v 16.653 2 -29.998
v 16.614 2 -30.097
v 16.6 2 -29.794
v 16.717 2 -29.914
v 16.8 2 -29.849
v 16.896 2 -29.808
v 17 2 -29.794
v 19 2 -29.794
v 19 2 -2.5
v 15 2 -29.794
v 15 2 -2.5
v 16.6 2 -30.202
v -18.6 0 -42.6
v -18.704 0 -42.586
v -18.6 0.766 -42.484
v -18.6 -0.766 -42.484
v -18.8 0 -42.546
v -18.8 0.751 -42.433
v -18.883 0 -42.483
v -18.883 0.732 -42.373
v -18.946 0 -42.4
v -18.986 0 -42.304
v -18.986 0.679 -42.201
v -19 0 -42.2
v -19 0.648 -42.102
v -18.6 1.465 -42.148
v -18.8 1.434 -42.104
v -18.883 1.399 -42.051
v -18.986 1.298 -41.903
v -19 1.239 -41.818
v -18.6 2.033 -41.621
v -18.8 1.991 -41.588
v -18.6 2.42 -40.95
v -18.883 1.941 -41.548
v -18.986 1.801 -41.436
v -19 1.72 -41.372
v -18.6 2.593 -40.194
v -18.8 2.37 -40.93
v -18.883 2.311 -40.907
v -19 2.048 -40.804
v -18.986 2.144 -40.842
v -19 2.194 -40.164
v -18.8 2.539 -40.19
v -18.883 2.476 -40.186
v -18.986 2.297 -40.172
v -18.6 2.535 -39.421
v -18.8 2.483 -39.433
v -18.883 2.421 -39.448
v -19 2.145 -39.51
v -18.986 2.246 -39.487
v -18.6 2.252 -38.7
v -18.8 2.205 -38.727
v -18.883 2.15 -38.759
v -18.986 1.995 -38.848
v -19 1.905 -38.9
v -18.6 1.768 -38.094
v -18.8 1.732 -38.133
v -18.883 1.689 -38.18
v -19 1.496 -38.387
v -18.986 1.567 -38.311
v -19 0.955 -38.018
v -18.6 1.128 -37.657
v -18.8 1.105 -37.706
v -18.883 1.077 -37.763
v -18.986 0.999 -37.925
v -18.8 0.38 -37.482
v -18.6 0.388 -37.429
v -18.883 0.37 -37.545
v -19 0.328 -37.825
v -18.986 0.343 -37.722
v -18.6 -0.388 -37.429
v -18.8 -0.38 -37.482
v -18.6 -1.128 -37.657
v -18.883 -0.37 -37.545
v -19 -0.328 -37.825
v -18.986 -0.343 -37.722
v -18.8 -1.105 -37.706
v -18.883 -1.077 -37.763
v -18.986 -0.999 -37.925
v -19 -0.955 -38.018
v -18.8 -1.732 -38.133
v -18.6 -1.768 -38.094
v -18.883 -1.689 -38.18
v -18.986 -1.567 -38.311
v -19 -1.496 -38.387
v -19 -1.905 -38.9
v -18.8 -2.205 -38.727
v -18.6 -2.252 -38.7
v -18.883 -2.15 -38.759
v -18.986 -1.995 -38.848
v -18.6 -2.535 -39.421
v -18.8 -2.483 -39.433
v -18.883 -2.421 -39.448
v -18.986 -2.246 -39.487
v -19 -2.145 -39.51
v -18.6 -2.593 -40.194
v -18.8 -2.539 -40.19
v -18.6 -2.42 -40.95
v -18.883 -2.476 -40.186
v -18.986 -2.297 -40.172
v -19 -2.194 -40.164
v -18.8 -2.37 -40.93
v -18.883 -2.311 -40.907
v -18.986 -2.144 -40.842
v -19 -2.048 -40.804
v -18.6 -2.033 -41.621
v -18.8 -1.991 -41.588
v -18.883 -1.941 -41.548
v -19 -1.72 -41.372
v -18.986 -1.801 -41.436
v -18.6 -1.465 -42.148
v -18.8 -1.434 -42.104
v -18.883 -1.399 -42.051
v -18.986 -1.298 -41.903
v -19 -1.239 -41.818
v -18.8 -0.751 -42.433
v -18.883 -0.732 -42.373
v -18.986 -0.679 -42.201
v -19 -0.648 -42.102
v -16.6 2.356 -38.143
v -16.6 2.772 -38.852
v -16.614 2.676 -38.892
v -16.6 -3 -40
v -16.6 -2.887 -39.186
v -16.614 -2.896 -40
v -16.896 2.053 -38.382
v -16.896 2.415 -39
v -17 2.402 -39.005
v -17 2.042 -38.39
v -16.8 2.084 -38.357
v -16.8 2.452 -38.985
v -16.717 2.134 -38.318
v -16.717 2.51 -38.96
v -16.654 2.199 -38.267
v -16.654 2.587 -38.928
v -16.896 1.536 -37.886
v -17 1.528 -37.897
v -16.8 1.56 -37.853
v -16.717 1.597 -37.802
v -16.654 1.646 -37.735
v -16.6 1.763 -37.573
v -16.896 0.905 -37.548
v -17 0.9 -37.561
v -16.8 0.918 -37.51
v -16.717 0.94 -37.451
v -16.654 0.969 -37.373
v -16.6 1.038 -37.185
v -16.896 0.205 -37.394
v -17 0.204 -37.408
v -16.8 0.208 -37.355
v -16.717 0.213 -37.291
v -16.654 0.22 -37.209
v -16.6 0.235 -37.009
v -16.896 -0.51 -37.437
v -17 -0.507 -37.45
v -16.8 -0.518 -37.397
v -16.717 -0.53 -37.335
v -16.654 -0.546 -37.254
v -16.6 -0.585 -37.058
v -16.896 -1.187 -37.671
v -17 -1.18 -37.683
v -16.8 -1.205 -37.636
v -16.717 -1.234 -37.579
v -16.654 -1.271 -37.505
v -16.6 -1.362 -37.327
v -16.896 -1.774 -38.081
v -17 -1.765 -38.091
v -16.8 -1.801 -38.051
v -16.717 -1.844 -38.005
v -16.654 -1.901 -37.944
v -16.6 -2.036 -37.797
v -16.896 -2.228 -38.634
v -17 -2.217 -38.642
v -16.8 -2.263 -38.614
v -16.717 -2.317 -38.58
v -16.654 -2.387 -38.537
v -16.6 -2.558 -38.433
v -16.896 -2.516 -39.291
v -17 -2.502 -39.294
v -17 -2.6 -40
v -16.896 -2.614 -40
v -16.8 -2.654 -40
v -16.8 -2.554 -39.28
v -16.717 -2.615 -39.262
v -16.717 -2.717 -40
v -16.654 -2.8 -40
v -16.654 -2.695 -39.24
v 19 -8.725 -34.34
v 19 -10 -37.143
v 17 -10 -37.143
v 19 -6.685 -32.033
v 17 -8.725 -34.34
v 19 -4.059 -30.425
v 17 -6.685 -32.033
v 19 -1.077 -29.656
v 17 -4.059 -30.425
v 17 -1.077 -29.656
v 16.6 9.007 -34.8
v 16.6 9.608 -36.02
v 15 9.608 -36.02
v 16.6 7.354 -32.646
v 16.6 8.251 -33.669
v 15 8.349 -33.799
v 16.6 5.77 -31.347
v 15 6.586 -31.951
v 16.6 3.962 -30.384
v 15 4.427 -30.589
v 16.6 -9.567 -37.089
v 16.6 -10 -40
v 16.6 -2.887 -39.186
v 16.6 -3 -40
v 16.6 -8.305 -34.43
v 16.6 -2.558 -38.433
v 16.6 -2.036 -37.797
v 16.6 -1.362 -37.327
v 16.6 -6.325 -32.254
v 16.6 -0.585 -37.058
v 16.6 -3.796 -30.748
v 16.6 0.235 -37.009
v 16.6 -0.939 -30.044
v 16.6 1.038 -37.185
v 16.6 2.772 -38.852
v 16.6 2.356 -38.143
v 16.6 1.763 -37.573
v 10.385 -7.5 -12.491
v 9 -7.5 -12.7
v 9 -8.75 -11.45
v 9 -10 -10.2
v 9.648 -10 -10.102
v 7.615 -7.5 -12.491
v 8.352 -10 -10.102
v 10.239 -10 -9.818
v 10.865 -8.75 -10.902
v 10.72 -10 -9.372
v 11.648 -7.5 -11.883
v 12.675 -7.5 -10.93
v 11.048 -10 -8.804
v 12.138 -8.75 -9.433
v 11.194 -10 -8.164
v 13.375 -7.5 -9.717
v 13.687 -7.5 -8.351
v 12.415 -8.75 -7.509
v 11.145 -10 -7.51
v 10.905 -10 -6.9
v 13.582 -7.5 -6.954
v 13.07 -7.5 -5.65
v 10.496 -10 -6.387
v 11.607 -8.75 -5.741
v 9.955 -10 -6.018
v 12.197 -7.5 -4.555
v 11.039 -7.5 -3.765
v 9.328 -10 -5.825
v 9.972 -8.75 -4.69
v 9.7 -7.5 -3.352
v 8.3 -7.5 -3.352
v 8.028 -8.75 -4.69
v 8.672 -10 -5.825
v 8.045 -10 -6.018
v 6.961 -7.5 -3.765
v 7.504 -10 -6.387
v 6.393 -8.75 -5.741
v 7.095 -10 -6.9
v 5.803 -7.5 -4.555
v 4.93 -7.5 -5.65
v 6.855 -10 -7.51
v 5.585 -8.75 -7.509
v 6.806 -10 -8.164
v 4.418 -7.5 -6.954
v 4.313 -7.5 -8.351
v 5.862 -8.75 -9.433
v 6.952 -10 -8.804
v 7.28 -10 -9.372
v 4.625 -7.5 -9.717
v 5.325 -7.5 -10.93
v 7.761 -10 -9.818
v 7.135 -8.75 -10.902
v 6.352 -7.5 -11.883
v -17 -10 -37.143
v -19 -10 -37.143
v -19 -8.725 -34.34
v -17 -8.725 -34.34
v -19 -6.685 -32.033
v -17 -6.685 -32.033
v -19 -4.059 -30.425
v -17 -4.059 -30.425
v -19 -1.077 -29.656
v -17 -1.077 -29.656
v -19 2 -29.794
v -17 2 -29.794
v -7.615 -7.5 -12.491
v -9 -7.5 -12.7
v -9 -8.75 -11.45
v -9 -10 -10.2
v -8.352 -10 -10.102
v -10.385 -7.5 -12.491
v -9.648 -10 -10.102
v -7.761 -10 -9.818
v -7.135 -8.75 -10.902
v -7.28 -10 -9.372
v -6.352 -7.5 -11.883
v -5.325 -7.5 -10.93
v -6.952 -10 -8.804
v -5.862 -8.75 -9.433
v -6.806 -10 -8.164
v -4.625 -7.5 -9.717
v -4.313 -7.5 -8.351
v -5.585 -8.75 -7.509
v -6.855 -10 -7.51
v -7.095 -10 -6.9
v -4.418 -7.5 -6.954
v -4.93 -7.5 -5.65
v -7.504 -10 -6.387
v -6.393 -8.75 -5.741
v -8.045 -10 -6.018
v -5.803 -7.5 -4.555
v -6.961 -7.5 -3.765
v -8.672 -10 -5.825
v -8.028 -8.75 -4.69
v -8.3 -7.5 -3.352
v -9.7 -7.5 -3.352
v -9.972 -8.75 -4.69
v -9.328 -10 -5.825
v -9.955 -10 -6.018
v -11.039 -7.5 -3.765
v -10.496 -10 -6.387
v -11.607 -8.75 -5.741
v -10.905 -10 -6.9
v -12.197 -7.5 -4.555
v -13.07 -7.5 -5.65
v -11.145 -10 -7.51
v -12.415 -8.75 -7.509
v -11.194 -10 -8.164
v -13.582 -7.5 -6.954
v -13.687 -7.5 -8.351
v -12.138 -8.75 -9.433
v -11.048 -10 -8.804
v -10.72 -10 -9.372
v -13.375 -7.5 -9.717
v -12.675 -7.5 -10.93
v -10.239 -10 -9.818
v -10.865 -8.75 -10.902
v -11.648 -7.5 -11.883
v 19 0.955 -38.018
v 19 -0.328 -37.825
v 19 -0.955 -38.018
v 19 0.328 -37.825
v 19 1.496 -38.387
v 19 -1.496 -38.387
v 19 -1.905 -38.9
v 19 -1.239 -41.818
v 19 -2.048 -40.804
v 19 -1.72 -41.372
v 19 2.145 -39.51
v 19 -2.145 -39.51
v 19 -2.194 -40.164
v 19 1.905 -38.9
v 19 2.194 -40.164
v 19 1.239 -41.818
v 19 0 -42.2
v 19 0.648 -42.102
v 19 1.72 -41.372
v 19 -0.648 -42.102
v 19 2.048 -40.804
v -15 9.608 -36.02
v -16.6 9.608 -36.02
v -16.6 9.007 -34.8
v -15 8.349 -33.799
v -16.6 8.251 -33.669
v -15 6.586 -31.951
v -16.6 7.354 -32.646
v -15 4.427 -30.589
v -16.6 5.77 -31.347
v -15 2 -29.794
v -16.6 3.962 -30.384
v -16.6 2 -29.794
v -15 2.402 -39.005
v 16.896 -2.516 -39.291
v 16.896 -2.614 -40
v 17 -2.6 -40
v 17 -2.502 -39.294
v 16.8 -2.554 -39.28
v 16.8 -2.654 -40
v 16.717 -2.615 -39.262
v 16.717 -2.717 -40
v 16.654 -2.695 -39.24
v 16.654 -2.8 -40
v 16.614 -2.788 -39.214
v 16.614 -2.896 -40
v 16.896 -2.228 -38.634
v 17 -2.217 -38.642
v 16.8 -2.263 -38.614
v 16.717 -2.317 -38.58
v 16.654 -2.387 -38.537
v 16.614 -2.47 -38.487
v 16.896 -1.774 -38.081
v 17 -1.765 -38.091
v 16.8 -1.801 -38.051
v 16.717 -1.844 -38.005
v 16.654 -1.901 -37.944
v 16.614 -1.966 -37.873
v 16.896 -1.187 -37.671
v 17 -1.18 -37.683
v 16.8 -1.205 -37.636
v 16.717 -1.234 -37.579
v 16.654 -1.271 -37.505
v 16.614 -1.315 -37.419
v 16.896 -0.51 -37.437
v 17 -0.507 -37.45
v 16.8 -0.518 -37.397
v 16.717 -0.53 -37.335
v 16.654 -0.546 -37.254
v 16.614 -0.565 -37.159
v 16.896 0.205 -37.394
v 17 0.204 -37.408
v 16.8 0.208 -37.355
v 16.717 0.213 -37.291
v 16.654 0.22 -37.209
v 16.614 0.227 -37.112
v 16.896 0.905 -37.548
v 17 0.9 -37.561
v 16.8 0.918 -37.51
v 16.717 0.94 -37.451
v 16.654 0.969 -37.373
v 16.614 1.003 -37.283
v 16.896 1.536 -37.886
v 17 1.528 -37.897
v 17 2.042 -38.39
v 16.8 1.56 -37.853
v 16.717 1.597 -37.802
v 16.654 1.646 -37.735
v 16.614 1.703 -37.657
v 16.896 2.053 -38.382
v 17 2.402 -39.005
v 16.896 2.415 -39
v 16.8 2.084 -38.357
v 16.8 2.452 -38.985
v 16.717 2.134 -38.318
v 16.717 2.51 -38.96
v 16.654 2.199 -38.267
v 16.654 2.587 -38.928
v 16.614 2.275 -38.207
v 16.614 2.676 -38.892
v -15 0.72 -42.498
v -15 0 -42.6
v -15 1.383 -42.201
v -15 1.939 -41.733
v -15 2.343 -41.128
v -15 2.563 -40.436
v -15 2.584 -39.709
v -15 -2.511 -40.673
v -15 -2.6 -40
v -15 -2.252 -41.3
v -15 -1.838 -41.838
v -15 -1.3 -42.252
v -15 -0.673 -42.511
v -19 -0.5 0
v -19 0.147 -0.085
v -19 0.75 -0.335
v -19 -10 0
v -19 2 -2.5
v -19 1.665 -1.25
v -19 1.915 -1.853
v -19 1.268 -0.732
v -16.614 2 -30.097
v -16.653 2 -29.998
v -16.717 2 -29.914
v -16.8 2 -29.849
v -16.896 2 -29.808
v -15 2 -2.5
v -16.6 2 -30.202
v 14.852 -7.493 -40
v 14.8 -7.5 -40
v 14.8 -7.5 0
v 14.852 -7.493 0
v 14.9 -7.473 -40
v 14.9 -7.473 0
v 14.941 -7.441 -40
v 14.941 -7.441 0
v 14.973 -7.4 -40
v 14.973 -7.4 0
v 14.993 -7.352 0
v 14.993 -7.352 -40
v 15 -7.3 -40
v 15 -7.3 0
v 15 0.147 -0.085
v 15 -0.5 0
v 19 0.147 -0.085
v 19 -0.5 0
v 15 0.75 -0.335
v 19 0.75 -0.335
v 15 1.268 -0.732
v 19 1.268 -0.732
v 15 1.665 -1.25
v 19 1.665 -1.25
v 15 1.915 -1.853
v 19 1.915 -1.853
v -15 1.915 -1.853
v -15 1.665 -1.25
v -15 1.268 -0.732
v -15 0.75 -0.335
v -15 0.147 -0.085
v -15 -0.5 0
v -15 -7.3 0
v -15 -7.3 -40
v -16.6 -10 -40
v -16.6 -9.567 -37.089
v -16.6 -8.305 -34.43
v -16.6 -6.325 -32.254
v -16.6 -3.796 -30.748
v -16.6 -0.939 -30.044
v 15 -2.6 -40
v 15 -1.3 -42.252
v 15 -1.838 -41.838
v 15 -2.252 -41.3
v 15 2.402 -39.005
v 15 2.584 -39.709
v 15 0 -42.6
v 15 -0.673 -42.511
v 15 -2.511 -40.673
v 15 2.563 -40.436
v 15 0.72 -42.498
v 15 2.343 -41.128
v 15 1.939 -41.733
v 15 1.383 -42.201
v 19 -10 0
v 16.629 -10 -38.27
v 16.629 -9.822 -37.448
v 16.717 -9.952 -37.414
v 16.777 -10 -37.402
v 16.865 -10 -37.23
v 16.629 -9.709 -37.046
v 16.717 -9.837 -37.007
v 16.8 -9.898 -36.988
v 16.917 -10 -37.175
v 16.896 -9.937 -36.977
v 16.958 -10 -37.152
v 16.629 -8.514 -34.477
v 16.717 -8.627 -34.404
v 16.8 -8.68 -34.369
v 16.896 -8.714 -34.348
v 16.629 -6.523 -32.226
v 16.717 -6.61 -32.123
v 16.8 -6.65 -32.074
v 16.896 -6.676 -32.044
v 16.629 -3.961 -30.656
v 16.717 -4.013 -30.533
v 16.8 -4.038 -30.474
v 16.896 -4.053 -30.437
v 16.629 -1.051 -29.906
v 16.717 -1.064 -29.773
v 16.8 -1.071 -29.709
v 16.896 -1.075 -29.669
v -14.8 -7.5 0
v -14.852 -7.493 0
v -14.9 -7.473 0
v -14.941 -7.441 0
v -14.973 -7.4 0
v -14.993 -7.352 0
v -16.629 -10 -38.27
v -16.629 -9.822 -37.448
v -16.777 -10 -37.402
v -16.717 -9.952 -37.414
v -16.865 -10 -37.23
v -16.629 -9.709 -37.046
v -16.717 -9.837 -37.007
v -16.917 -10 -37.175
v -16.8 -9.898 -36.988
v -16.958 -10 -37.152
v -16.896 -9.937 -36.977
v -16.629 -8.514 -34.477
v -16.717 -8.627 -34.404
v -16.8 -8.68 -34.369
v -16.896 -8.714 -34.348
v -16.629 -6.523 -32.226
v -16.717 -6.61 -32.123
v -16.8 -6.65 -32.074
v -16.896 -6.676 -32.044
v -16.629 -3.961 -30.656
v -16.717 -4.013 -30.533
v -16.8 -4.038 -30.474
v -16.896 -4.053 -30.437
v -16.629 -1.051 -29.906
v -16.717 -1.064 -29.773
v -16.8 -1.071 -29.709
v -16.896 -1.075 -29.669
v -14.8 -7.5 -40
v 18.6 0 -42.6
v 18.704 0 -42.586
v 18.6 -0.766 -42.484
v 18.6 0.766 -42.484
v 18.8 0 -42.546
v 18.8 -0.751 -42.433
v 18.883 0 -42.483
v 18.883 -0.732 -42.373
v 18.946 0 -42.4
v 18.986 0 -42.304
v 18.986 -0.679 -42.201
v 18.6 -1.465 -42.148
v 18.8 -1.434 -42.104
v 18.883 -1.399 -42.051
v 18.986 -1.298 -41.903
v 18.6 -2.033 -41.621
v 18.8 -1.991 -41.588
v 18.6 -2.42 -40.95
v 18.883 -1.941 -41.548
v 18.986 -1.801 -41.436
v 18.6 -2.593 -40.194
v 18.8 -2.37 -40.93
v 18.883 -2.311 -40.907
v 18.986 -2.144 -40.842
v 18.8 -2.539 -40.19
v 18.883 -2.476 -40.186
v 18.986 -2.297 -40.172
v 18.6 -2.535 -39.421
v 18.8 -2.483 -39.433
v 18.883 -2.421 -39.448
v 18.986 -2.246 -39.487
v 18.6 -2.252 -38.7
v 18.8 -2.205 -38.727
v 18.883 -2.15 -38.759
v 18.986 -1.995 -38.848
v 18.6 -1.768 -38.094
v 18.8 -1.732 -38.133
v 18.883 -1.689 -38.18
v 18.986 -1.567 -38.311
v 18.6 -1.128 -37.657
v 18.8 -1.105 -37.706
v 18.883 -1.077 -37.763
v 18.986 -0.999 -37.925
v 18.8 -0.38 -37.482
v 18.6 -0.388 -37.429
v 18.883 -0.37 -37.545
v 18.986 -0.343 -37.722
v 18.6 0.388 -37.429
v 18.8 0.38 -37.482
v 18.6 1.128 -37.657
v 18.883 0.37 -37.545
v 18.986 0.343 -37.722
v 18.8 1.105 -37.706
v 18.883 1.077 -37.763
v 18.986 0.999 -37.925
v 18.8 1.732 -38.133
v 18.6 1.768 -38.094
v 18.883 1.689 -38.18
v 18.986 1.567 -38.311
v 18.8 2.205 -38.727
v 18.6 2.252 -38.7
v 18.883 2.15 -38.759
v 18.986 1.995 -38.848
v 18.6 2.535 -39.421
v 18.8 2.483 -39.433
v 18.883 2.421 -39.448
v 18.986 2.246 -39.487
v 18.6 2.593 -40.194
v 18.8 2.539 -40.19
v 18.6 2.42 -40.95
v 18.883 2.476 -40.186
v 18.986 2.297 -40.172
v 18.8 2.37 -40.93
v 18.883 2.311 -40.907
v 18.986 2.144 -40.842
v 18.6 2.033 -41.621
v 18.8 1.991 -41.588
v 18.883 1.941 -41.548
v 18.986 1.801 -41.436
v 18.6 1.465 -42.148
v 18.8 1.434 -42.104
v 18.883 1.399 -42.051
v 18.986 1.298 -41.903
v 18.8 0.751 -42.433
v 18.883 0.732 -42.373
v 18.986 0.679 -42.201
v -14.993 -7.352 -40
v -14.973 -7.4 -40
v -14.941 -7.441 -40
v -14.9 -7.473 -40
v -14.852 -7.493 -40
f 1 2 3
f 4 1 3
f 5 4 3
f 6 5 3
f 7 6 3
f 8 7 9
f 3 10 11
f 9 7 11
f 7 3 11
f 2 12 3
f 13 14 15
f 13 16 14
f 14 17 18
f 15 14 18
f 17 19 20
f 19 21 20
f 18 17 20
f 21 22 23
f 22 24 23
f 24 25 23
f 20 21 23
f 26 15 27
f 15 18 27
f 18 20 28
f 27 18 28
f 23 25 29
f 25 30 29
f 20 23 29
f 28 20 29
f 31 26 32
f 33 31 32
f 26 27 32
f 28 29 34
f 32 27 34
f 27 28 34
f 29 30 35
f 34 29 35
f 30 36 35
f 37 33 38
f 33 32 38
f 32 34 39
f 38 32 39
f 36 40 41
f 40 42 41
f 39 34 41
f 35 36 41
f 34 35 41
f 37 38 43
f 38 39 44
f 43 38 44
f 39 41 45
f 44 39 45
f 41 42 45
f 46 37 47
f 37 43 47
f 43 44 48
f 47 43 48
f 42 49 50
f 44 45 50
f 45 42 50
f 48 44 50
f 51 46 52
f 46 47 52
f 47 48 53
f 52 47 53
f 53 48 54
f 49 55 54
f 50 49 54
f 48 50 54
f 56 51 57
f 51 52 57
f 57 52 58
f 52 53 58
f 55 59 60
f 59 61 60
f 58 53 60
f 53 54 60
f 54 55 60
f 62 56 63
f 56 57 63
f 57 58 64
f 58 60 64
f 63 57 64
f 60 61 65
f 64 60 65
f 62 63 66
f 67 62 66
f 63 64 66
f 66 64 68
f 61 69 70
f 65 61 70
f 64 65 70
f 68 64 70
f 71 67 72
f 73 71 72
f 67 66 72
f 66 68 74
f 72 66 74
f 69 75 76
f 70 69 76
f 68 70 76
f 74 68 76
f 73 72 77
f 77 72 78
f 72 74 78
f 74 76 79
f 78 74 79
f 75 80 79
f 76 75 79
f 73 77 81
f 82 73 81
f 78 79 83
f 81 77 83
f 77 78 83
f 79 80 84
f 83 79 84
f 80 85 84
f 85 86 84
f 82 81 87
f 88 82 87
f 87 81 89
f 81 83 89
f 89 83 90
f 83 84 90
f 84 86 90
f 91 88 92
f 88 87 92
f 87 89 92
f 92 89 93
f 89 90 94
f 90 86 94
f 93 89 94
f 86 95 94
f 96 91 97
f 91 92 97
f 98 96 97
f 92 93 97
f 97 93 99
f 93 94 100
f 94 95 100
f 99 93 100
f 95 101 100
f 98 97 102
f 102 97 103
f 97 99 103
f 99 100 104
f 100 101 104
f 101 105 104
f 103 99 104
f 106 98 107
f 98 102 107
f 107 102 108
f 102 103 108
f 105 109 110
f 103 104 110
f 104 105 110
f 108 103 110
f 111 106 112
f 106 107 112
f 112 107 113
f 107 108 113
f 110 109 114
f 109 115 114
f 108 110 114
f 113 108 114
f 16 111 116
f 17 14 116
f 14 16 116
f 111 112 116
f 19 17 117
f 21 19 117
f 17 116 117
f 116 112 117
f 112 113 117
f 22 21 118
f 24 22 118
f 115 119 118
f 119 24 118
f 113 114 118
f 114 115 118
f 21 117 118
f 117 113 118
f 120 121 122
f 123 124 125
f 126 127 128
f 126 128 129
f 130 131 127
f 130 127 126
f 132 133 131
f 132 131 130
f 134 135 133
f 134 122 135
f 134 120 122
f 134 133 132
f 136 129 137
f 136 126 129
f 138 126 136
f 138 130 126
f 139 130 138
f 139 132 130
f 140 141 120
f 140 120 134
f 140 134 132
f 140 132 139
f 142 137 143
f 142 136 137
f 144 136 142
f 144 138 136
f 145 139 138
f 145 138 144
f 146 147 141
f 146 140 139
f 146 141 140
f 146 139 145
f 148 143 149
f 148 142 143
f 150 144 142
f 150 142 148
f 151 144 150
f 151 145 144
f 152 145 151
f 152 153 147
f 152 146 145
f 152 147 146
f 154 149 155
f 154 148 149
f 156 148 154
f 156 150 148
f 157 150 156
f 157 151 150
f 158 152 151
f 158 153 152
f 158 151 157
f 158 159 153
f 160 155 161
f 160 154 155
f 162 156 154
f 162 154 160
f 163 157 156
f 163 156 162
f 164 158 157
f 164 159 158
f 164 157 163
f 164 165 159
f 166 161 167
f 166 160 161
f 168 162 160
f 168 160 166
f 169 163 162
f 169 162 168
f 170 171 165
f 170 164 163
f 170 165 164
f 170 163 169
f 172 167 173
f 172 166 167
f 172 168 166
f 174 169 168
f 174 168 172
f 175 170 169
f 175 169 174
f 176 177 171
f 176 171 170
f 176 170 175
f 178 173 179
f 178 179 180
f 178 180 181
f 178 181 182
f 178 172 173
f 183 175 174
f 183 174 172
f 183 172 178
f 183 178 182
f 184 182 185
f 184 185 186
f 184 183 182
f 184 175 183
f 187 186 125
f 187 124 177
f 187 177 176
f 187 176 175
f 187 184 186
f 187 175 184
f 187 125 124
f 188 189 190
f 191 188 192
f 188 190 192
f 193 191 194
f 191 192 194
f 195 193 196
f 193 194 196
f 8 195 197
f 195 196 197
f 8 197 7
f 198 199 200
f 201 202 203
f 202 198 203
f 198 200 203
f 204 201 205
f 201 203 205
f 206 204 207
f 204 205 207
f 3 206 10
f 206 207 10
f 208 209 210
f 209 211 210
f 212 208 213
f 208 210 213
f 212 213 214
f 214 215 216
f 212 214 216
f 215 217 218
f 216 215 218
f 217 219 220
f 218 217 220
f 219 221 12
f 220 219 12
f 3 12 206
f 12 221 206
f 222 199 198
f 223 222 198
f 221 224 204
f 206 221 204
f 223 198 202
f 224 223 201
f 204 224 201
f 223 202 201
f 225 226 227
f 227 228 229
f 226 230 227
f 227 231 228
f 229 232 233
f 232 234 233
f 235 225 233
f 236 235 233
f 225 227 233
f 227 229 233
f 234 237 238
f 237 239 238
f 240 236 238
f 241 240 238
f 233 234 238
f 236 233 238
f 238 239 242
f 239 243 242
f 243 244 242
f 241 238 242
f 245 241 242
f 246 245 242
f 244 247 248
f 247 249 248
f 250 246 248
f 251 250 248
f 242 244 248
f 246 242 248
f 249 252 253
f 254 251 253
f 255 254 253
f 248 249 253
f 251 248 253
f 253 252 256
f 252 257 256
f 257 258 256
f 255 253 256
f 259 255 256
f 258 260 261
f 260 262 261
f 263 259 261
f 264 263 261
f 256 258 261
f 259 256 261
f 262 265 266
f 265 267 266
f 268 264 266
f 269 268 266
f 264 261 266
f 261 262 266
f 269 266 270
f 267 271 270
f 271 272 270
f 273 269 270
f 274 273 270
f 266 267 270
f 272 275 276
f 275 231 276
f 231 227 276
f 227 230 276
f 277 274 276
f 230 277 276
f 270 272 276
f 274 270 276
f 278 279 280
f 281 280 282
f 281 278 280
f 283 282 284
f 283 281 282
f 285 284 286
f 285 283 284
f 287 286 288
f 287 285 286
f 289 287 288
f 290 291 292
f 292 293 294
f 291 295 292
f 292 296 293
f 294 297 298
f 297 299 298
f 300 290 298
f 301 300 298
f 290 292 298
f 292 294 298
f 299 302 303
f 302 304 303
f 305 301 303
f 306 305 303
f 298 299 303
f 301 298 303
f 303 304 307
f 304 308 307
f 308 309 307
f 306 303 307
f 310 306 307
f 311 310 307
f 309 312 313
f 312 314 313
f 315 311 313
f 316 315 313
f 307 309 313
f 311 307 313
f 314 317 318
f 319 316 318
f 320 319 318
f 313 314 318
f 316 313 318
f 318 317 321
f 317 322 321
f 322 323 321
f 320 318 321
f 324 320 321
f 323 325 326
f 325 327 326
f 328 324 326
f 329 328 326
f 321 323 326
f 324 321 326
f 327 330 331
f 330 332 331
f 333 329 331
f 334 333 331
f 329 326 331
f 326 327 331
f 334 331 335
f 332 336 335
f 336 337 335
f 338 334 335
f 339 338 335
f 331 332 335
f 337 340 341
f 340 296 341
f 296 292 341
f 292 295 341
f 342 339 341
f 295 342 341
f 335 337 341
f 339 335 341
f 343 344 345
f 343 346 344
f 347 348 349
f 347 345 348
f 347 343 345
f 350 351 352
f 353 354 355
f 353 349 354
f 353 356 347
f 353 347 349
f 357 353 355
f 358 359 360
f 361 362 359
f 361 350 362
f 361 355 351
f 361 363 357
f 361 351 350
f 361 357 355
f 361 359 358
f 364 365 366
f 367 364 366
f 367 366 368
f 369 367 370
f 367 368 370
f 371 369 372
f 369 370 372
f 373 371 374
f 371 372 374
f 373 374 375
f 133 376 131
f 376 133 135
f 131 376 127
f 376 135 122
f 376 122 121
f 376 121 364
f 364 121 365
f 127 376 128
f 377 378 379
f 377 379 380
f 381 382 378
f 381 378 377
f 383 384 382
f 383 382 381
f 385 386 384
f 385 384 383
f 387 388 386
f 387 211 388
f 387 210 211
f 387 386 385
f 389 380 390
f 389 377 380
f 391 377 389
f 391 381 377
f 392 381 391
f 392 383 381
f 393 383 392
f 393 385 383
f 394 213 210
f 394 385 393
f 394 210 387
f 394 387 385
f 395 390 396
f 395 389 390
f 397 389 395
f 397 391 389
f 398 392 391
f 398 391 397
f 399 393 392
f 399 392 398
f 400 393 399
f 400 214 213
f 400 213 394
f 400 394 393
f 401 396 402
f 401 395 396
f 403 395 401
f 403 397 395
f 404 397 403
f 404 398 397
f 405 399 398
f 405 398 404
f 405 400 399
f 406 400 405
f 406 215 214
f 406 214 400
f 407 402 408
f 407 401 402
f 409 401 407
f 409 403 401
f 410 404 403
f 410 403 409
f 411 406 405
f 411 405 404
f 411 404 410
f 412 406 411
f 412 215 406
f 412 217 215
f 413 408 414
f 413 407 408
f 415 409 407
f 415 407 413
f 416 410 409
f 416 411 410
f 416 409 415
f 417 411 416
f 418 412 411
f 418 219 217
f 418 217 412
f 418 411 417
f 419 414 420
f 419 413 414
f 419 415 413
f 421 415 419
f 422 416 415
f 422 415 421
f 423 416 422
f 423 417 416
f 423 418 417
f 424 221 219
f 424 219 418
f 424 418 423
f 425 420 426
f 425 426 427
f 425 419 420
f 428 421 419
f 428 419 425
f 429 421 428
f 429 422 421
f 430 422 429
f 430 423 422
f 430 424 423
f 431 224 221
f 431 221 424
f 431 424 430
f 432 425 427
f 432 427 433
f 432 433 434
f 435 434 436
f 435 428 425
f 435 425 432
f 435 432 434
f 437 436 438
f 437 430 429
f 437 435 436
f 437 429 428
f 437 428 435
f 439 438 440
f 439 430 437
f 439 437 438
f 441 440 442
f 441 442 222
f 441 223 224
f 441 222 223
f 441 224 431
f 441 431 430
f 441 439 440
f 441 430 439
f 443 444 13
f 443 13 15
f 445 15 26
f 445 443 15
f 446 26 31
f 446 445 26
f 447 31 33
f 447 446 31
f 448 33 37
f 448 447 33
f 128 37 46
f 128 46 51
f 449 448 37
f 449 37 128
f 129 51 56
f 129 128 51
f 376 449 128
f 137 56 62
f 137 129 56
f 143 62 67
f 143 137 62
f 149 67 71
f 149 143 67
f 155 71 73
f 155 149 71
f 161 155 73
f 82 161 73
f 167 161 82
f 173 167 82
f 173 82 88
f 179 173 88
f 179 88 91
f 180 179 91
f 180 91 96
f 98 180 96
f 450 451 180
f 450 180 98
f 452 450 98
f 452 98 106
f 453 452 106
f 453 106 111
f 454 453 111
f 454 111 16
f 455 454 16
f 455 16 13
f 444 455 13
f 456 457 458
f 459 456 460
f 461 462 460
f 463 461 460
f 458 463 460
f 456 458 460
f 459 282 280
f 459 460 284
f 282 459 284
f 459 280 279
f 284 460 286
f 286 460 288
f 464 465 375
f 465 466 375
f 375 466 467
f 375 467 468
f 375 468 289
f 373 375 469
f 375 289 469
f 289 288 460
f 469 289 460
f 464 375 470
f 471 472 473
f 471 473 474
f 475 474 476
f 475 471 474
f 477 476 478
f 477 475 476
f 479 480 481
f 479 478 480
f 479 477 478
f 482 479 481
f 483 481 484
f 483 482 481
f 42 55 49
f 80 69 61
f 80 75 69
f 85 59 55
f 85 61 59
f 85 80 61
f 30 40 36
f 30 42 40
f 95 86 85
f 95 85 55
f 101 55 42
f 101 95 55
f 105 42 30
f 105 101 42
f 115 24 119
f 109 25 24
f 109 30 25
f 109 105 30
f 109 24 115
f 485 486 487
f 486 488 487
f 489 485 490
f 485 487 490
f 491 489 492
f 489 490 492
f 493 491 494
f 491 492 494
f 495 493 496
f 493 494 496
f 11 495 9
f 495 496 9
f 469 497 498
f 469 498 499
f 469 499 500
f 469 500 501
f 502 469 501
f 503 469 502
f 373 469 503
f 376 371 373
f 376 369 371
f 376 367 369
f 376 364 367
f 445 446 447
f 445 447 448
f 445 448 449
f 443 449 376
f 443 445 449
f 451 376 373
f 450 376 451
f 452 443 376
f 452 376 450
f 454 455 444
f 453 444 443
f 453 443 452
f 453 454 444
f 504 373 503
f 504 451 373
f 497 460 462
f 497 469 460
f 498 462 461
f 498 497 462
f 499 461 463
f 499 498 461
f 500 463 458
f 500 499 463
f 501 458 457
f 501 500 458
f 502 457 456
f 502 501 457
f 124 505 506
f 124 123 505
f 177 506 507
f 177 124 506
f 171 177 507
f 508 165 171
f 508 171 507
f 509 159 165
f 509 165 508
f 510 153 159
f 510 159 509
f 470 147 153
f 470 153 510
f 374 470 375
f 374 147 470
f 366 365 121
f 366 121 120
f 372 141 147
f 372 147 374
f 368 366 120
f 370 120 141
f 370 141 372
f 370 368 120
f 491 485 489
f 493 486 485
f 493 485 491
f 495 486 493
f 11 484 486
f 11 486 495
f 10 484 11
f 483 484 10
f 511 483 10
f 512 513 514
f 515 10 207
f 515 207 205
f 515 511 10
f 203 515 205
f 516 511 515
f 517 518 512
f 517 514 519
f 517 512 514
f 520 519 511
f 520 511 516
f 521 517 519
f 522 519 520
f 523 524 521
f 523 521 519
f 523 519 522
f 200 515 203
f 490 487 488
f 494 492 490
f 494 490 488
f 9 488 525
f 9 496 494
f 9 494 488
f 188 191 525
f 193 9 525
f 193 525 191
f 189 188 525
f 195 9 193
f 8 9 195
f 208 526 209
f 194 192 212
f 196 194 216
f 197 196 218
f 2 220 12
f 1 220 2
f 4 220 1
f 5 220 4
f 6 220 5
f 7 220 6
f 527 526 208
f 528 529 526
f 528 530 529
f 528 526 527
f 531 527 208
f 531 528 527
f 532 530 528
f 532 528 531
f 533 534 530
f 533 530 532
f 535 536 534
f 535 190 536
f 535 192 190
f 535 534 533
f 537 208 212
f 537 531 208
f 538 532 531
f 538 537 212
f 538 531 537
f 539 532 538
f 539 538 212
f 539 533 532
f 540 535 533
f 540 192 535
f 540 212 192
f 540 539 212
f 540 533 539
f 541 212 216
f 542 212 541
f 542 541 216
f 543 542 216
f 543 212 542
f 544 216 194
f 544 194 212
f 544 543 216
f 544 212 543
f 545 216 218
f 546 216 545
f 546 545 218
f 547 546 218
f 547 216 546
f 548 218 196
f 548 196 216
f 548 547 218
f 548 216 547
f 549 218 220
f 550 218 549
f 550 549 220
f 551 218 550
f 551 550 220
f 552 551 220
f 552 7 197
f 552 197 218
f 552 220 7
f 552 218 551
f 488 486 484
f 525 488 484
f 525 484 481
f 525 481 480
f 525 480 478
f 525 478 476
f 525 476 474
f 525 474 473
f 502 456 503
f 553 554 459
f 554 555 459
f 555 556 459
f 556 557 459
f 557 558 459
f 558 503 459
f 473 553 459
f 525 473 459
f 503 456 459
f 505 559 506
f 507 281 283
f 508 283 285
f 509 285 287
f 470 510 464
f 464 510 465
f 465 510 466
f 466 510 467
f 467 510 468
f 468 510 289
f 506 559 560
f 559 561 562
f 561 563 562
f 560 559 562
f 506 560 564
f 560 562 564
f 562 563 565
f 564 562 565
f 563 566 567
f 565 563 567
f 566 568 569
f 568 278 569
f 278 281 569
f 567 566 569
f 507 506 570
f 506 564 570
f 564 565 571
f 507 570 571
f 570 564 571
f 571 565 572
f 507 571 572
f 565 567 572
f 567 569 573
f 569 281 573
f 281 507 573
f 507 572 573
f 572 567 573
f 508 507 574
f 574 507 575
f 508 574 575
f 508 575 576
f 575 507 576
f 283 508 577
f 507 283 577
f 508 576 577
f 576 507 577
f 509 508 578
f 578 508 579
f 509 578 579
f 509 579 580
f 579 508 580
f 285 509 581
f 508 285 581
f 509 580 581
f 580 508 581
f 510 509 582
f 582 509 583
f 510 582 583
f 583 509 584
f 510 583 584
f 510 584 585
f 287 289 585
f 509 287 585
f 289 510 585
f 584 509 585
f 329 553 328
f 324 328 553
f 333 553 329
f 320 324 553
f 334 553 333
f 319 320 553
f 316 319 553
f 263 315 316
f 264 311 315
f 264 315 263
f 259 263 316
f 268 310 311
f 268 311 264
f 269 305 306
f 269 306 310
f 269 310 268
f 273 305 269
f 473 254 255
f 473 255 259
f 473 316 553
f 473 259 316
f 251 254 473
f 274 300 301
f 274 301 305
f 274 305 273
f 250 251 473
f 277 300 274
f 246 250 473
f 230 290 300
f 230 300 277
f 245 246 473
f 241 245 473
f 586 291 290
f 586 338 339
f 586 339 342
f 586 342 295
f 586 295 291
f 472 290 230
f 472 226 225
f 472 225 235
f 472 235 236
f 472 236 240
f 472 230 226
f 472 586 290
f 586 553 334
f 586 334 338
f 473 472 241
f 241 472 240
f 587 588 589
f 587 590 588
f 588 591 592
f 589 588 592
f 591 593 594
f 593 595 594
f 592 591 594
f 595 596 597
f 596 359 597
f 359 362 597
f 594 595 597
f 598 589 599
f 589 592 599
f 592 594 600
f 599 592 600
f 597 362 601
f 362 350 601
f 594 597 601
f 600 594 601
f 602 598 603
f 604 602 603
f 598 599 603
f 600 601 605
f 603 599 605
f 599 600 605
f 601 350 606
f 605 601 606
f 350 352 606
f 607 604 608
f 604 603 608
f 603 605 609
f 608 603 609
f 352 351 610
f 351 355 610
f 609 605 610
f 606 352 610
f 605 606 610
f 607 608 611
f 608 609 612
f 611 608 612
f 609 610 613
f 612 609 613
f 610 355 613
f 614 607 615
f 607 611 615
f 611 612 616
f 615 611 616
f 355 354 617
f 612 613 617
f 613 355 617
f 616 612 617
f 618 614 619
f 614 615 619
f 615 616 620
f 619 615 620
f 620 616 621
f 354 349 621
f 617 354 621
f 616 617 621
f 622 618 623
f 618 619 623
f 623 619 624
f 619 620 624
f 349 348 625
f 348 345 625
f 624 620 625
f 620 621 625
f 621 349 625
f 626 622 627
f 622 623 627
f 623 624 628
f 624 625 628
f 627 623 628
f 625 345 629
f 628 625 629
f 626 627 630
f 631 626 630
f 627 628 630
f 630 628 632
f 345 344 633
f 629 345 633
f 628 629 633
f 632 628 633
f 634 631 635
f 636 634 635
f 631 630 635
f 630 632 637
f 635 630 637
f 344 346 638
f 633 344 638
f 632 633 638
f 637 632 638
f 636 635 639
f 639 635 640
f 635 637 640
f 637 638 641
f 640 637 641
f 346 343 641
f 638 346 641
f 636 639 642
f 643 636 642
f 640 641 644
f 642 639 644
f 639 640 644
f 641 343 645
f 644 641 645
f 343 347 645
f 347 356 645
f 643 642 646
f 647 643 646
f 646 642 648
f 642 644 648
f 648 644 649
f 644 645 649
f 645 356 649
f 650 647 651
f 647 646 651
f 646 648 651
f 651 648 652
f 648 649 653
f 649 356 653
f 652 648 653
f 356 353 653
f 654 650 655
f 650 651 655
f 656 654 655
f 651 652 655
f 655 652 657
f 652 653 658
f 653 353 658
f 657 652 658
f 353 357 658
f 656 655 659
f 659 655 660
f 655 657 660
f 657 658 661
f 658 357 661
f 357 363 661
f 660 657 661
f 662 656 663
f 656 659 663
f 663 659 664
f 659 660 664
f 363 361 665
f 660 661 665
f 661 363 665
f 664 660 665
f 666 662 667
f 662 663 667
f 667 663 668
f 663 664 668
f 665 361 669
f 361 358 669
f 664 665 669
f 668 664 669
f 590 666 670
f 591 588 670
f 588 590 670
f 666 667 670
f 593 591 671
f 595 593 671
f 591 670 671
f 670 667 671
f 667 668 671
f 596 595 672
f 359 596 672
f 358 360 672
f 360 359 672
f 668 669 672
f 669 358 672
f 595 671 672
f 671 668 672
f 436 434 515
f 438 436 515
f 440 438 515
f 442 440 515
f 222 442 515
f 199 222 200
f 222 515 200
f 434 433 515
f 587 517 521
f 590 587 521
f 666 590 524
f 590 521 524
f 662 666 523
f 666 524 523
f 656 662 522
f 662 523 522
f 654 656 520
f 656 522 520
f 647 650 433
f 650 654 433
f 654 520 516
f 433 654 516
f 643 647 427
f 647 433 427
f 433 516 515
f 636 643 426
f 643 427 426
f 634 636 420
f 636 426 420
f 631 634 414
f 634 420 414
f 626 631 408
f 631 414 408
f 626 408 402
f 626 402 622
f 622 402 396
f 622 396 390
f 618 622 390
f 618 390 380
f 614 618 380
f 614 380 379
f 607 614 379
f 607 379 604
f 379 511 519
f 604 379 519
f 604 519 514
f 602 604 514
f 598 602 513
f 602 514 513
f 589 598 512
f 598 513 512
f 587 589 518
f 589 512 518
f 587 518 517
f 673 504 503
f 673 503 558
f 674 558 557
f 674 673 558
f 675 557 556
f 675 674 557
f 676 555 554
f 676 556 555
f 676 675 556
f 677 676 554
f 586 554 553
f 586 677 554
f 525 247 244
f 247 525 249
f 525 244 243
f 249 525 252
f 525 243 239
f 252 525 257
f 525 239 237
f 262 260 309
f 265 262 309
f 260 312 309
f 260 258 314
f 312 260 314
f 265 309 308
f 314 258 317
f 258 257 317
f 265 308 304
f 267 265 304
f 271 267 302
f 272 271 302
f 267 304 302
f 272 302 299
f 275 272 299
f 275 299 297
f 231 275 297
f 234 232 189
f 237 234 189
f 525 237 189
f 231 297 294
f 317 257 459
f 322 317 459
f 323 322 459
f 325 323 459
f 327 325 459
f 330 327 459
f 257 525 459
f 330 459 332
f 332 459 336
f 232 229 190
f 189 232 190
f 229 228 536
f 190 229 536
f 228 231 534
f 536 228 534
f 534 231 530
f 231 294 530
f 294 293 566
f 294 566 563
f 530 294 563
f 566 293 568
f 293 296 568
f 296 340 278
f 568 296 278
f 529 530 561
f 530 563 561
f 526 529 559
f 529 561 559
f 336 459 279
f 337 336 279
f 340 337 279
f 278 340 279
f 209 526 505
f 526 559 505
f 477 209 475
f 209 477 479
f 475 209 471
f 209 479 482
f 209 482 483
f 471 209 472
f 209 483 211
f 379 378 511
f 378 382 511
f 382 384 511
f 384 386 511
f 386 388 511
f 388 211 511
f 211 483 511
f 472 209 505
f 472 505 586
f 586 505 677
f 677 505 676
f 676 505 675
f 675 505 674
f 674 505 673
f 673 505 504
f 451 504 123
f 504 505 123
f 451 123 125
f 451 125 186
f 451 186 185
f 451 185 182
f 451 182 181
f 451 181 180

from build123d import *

# Parameters (mm, degrees)
BOSS_EXTRUDE5_START             = -19
BOSS_EXTRUDE5_DEPTH             = 38
CUT_EXTRUDE1_START              = -2.4
CUT_EXTRUDE1_DEPTH              = 2.4
BOSS_EXTRUDE4_REACH             = 47.398
SKETCH5_R                       = 2.6
BOSS_EXTRUDE4_DIRECTION_2_REACH = 47.398
CUT_EXTRUDE3_DEPTH              = 48.70492637
CUT_EXTRUDE3_DEPTH_BACK         = 48.70492637
FILLET17_R                      = 0.4
FILLET_1_R                      = 2.5
HOLE_WIZARD_M41_D               = 4.2
HOLE_WIZARD_M41_DEPTH           = 8.5
HOLE_WIZARD_M41_CSINK_D         = 9.4
HOLE_WIZARD_M41_CSINK_ANGLE     = 90
HOLE_WIZARD_M41_TIP             = 1.2618073


# Read off the part's stored shape, not the designer's step: Boss-Extrude5
with BuildPart() as part:
    # Boss-Extrude5 outline → Boss-Extrude5 (new body)
    with BuildSketch(Plane(origin=(0, 0, 0), x_dir=(0, 0, -1), z_dir=(1, 0, 0)).offset(BOSS_EXTRUDE5_START)):
        with BuildLine():
            Line((0, -10), (40, -10))
            Line((40, -10), (40, 0))
            Line((40, 0), (36.020092303, 9.608347138))
            ThreePointArc((36.020092303, 9.608347138), (31.951342699, 6.586282384), (29.794119342, 2))
            Line((29.794119342, 2), (0, 2))
            Line((0, 2), (0, -10))
        make_face()
    extrude(amount=BOSS_EXTRUDE5_DEPTH)

    # Sketch4 → Cut-Extrude1 (cut)
    with BuildSketch(Plane(origin=(19, 0, 0), x_dir=(0, 0, -1), z_dir=(1, 0, 0)).offset(CUT_EXTRUDE1_START)):
        with BuildLine():
            Line((32.646089476, 7.353910524), (50.4, 25.107821049))
            Line((50.4, 25.107821049), (50.4, 0))
            ThreePointArc((50.4, 0), (36.020092303, -9.608347138), (32.646089476, 7.353910524))
        make_face()
    cut_extrude1 = extrude(amount=CUT_EXTRUDE1_DEPTH, mode=Mode.SUBTRACT)

    # Mirror1: Cut-Extrude1 across plane
    add(cut_extrude1.mirror(Plane(origin=(0, 0, 0), x_dir=(0, 0, 1), z_dir=(1, 0, 0))), mode=Mode.SUBTRACT)

    # Boss-Extrude4: up to this face of the body (flat: up to its plane)
    boss_extrude4_end = Plane(part.part.faces().sort_by_distance((19, -4.194169539, -15.691958581))[0])
    # Sketch5 → Boss-Extrude4 (add, up to the picked face)
    with BuildSketch(Plane(origin=(0, 0, 0), x_dir=(0, 0, -1), z_dir=(1, 0, 0)), mode=Mode.PRIVATE) as boss_extrude4_sk1:
        with Locations((40, 0)):
            Circle(SKETCH5_R)
    boss_extrude4_tool1 = split(extrude(boss_extrude4_sk1.sketch, amount=BOSS_EXTRUDE4_REACH, mode=Mode.PRIVATE), bisect_by=boss_extrude4_end, keep=Keep.BOTH, mode=Mode.PRIVATE)
    add(boss_extrude4_tool1.solids().sort_by(Axis((0, 0, -40), (1, 0, 0)))[0])

    # Boss-Extrude4 direction 2: up to this face of the body (flat: up to its plane)
    boss_extrude4_direction_2_end = Plane(part.part.faces().sort_by_distance((-19, -4.194169539, -15.691958581))[0])
    # Sketch5 → Boss-Extrude4 direction 2 (add, up to the picked face)
    with BuildSketch(Plane(origin=(0, 0, 0), x_dir=(0, 0, -1), z_dir=(1, 0, 0)), mode=Mode.PRIVATE) as boss_extrude4_direction_2_sk1:
        with Locations((40, 0)):
            Circle(SKETCH5_R)
    boss_extrude4_direction_2_tool1 = split(extrude(boss_extrude4_direction_2_sk1.sketch, amount=-BOSS_EXTRUDE4_DIRECTION_2_REACH, mode=Mode.PRIVATE), bisect_by=boss_extrude4_direction_2_end, keep=Keep.BOTH, mode=Mode.PRIVATE)
    add(boss_extrude4_direction_2_tool1.solids().sort_by(Axis((0, 0, -40), (-1, 0, 0)))[0])

    # Sketch7 → Cut-Extrude3 (cut, two sides: drawn at the far end of the back side and taken through both)
    with BuildSketch(Plane.XY.offset(-CUT_EXTRUDE3_DEPTH_BACK)):
        with BuildLine():
            Line((-14.8, -7.5), (14.8, -7.5))
            ThreePointArc((14.8, -7.5), (14.941421356, -7.441421356), (15, -7.3))
            Line((15, -7.3), (15, 12.3))
            ThreePointArc((15, 12.3), (14.941421356, 12.441421356), (14.8, 12.5))
            Line((14.8, 12.5), (-14.8, 12.5))
            ThreePointArc((-14.8, 12.5), (-14.941421356, 12.441421356), (-15, 12.3))
            Line((-15, 12.3), (-15, -7.3))
            ThreePointArc((-15, -7.3), (-14.941421356, -7.441421356), (-14.8, -7.5))
        make_face()
    extrude(amount=CUT_EXTRUDE3_DEPTH + CUT_EXTRUDE3_DEPTH_BACK, mode=Mode.SUBTRACT)

    # Fillet17
    fillet17_edges = [part.edges().sort_by_distance(p)[0] for p in [
        (-19, 0, -37.4),
        (19, 0, -37.4),
        (-16.6, -0.507234837, -37.449958271),
        (16.6, -0.507234837, -37.449958271),
        (16.6, -5.431674396, -31.13112672),
        (-16.6, -5.431674396, -31.13112672),
    ]]
    fillet(fillet17_edges, radius=FILLET17_R)

    # Скругление1
    fillet_1_edges = [part.edges().sort_by_distance(p)[0] for p in [
        (17, 2, 0),
        (-17, 2, 0),
    ]]
    fillet(fillet_1_edges, radius=FILLET_1_R)

    # Зенковка для винта с полупотайной головкой M41
    with Locations(Plane(origin=(-9, -7.5, -8), x_dir=(0, 0, 1), z_dir=(0, 1, 0))):
        with Locations((0, 0), (0, 18)):
            CounterSinkHole(HOLE_WIZARD_M41_D / 2, HOLE_WIZARD_M41_CSINK_D / 2, depth=HOLE_WIZARD_M41_DEPTH, counter_sink_angle=HOLE_WIZARD_M41_CSINK_ANGLE)
            with Locations((0, 0, -(HOLE_WIZARD_M41_DEPTH + HOLE_WIZARD_M41_TIP / 2))):  # 118° drill point
                Cone(0, HOLE_WIZARD_M41_D / 2, HOLE_WIZARD_M41_TIP, mode=Mode.SUBTRACT)


solid = part.part
